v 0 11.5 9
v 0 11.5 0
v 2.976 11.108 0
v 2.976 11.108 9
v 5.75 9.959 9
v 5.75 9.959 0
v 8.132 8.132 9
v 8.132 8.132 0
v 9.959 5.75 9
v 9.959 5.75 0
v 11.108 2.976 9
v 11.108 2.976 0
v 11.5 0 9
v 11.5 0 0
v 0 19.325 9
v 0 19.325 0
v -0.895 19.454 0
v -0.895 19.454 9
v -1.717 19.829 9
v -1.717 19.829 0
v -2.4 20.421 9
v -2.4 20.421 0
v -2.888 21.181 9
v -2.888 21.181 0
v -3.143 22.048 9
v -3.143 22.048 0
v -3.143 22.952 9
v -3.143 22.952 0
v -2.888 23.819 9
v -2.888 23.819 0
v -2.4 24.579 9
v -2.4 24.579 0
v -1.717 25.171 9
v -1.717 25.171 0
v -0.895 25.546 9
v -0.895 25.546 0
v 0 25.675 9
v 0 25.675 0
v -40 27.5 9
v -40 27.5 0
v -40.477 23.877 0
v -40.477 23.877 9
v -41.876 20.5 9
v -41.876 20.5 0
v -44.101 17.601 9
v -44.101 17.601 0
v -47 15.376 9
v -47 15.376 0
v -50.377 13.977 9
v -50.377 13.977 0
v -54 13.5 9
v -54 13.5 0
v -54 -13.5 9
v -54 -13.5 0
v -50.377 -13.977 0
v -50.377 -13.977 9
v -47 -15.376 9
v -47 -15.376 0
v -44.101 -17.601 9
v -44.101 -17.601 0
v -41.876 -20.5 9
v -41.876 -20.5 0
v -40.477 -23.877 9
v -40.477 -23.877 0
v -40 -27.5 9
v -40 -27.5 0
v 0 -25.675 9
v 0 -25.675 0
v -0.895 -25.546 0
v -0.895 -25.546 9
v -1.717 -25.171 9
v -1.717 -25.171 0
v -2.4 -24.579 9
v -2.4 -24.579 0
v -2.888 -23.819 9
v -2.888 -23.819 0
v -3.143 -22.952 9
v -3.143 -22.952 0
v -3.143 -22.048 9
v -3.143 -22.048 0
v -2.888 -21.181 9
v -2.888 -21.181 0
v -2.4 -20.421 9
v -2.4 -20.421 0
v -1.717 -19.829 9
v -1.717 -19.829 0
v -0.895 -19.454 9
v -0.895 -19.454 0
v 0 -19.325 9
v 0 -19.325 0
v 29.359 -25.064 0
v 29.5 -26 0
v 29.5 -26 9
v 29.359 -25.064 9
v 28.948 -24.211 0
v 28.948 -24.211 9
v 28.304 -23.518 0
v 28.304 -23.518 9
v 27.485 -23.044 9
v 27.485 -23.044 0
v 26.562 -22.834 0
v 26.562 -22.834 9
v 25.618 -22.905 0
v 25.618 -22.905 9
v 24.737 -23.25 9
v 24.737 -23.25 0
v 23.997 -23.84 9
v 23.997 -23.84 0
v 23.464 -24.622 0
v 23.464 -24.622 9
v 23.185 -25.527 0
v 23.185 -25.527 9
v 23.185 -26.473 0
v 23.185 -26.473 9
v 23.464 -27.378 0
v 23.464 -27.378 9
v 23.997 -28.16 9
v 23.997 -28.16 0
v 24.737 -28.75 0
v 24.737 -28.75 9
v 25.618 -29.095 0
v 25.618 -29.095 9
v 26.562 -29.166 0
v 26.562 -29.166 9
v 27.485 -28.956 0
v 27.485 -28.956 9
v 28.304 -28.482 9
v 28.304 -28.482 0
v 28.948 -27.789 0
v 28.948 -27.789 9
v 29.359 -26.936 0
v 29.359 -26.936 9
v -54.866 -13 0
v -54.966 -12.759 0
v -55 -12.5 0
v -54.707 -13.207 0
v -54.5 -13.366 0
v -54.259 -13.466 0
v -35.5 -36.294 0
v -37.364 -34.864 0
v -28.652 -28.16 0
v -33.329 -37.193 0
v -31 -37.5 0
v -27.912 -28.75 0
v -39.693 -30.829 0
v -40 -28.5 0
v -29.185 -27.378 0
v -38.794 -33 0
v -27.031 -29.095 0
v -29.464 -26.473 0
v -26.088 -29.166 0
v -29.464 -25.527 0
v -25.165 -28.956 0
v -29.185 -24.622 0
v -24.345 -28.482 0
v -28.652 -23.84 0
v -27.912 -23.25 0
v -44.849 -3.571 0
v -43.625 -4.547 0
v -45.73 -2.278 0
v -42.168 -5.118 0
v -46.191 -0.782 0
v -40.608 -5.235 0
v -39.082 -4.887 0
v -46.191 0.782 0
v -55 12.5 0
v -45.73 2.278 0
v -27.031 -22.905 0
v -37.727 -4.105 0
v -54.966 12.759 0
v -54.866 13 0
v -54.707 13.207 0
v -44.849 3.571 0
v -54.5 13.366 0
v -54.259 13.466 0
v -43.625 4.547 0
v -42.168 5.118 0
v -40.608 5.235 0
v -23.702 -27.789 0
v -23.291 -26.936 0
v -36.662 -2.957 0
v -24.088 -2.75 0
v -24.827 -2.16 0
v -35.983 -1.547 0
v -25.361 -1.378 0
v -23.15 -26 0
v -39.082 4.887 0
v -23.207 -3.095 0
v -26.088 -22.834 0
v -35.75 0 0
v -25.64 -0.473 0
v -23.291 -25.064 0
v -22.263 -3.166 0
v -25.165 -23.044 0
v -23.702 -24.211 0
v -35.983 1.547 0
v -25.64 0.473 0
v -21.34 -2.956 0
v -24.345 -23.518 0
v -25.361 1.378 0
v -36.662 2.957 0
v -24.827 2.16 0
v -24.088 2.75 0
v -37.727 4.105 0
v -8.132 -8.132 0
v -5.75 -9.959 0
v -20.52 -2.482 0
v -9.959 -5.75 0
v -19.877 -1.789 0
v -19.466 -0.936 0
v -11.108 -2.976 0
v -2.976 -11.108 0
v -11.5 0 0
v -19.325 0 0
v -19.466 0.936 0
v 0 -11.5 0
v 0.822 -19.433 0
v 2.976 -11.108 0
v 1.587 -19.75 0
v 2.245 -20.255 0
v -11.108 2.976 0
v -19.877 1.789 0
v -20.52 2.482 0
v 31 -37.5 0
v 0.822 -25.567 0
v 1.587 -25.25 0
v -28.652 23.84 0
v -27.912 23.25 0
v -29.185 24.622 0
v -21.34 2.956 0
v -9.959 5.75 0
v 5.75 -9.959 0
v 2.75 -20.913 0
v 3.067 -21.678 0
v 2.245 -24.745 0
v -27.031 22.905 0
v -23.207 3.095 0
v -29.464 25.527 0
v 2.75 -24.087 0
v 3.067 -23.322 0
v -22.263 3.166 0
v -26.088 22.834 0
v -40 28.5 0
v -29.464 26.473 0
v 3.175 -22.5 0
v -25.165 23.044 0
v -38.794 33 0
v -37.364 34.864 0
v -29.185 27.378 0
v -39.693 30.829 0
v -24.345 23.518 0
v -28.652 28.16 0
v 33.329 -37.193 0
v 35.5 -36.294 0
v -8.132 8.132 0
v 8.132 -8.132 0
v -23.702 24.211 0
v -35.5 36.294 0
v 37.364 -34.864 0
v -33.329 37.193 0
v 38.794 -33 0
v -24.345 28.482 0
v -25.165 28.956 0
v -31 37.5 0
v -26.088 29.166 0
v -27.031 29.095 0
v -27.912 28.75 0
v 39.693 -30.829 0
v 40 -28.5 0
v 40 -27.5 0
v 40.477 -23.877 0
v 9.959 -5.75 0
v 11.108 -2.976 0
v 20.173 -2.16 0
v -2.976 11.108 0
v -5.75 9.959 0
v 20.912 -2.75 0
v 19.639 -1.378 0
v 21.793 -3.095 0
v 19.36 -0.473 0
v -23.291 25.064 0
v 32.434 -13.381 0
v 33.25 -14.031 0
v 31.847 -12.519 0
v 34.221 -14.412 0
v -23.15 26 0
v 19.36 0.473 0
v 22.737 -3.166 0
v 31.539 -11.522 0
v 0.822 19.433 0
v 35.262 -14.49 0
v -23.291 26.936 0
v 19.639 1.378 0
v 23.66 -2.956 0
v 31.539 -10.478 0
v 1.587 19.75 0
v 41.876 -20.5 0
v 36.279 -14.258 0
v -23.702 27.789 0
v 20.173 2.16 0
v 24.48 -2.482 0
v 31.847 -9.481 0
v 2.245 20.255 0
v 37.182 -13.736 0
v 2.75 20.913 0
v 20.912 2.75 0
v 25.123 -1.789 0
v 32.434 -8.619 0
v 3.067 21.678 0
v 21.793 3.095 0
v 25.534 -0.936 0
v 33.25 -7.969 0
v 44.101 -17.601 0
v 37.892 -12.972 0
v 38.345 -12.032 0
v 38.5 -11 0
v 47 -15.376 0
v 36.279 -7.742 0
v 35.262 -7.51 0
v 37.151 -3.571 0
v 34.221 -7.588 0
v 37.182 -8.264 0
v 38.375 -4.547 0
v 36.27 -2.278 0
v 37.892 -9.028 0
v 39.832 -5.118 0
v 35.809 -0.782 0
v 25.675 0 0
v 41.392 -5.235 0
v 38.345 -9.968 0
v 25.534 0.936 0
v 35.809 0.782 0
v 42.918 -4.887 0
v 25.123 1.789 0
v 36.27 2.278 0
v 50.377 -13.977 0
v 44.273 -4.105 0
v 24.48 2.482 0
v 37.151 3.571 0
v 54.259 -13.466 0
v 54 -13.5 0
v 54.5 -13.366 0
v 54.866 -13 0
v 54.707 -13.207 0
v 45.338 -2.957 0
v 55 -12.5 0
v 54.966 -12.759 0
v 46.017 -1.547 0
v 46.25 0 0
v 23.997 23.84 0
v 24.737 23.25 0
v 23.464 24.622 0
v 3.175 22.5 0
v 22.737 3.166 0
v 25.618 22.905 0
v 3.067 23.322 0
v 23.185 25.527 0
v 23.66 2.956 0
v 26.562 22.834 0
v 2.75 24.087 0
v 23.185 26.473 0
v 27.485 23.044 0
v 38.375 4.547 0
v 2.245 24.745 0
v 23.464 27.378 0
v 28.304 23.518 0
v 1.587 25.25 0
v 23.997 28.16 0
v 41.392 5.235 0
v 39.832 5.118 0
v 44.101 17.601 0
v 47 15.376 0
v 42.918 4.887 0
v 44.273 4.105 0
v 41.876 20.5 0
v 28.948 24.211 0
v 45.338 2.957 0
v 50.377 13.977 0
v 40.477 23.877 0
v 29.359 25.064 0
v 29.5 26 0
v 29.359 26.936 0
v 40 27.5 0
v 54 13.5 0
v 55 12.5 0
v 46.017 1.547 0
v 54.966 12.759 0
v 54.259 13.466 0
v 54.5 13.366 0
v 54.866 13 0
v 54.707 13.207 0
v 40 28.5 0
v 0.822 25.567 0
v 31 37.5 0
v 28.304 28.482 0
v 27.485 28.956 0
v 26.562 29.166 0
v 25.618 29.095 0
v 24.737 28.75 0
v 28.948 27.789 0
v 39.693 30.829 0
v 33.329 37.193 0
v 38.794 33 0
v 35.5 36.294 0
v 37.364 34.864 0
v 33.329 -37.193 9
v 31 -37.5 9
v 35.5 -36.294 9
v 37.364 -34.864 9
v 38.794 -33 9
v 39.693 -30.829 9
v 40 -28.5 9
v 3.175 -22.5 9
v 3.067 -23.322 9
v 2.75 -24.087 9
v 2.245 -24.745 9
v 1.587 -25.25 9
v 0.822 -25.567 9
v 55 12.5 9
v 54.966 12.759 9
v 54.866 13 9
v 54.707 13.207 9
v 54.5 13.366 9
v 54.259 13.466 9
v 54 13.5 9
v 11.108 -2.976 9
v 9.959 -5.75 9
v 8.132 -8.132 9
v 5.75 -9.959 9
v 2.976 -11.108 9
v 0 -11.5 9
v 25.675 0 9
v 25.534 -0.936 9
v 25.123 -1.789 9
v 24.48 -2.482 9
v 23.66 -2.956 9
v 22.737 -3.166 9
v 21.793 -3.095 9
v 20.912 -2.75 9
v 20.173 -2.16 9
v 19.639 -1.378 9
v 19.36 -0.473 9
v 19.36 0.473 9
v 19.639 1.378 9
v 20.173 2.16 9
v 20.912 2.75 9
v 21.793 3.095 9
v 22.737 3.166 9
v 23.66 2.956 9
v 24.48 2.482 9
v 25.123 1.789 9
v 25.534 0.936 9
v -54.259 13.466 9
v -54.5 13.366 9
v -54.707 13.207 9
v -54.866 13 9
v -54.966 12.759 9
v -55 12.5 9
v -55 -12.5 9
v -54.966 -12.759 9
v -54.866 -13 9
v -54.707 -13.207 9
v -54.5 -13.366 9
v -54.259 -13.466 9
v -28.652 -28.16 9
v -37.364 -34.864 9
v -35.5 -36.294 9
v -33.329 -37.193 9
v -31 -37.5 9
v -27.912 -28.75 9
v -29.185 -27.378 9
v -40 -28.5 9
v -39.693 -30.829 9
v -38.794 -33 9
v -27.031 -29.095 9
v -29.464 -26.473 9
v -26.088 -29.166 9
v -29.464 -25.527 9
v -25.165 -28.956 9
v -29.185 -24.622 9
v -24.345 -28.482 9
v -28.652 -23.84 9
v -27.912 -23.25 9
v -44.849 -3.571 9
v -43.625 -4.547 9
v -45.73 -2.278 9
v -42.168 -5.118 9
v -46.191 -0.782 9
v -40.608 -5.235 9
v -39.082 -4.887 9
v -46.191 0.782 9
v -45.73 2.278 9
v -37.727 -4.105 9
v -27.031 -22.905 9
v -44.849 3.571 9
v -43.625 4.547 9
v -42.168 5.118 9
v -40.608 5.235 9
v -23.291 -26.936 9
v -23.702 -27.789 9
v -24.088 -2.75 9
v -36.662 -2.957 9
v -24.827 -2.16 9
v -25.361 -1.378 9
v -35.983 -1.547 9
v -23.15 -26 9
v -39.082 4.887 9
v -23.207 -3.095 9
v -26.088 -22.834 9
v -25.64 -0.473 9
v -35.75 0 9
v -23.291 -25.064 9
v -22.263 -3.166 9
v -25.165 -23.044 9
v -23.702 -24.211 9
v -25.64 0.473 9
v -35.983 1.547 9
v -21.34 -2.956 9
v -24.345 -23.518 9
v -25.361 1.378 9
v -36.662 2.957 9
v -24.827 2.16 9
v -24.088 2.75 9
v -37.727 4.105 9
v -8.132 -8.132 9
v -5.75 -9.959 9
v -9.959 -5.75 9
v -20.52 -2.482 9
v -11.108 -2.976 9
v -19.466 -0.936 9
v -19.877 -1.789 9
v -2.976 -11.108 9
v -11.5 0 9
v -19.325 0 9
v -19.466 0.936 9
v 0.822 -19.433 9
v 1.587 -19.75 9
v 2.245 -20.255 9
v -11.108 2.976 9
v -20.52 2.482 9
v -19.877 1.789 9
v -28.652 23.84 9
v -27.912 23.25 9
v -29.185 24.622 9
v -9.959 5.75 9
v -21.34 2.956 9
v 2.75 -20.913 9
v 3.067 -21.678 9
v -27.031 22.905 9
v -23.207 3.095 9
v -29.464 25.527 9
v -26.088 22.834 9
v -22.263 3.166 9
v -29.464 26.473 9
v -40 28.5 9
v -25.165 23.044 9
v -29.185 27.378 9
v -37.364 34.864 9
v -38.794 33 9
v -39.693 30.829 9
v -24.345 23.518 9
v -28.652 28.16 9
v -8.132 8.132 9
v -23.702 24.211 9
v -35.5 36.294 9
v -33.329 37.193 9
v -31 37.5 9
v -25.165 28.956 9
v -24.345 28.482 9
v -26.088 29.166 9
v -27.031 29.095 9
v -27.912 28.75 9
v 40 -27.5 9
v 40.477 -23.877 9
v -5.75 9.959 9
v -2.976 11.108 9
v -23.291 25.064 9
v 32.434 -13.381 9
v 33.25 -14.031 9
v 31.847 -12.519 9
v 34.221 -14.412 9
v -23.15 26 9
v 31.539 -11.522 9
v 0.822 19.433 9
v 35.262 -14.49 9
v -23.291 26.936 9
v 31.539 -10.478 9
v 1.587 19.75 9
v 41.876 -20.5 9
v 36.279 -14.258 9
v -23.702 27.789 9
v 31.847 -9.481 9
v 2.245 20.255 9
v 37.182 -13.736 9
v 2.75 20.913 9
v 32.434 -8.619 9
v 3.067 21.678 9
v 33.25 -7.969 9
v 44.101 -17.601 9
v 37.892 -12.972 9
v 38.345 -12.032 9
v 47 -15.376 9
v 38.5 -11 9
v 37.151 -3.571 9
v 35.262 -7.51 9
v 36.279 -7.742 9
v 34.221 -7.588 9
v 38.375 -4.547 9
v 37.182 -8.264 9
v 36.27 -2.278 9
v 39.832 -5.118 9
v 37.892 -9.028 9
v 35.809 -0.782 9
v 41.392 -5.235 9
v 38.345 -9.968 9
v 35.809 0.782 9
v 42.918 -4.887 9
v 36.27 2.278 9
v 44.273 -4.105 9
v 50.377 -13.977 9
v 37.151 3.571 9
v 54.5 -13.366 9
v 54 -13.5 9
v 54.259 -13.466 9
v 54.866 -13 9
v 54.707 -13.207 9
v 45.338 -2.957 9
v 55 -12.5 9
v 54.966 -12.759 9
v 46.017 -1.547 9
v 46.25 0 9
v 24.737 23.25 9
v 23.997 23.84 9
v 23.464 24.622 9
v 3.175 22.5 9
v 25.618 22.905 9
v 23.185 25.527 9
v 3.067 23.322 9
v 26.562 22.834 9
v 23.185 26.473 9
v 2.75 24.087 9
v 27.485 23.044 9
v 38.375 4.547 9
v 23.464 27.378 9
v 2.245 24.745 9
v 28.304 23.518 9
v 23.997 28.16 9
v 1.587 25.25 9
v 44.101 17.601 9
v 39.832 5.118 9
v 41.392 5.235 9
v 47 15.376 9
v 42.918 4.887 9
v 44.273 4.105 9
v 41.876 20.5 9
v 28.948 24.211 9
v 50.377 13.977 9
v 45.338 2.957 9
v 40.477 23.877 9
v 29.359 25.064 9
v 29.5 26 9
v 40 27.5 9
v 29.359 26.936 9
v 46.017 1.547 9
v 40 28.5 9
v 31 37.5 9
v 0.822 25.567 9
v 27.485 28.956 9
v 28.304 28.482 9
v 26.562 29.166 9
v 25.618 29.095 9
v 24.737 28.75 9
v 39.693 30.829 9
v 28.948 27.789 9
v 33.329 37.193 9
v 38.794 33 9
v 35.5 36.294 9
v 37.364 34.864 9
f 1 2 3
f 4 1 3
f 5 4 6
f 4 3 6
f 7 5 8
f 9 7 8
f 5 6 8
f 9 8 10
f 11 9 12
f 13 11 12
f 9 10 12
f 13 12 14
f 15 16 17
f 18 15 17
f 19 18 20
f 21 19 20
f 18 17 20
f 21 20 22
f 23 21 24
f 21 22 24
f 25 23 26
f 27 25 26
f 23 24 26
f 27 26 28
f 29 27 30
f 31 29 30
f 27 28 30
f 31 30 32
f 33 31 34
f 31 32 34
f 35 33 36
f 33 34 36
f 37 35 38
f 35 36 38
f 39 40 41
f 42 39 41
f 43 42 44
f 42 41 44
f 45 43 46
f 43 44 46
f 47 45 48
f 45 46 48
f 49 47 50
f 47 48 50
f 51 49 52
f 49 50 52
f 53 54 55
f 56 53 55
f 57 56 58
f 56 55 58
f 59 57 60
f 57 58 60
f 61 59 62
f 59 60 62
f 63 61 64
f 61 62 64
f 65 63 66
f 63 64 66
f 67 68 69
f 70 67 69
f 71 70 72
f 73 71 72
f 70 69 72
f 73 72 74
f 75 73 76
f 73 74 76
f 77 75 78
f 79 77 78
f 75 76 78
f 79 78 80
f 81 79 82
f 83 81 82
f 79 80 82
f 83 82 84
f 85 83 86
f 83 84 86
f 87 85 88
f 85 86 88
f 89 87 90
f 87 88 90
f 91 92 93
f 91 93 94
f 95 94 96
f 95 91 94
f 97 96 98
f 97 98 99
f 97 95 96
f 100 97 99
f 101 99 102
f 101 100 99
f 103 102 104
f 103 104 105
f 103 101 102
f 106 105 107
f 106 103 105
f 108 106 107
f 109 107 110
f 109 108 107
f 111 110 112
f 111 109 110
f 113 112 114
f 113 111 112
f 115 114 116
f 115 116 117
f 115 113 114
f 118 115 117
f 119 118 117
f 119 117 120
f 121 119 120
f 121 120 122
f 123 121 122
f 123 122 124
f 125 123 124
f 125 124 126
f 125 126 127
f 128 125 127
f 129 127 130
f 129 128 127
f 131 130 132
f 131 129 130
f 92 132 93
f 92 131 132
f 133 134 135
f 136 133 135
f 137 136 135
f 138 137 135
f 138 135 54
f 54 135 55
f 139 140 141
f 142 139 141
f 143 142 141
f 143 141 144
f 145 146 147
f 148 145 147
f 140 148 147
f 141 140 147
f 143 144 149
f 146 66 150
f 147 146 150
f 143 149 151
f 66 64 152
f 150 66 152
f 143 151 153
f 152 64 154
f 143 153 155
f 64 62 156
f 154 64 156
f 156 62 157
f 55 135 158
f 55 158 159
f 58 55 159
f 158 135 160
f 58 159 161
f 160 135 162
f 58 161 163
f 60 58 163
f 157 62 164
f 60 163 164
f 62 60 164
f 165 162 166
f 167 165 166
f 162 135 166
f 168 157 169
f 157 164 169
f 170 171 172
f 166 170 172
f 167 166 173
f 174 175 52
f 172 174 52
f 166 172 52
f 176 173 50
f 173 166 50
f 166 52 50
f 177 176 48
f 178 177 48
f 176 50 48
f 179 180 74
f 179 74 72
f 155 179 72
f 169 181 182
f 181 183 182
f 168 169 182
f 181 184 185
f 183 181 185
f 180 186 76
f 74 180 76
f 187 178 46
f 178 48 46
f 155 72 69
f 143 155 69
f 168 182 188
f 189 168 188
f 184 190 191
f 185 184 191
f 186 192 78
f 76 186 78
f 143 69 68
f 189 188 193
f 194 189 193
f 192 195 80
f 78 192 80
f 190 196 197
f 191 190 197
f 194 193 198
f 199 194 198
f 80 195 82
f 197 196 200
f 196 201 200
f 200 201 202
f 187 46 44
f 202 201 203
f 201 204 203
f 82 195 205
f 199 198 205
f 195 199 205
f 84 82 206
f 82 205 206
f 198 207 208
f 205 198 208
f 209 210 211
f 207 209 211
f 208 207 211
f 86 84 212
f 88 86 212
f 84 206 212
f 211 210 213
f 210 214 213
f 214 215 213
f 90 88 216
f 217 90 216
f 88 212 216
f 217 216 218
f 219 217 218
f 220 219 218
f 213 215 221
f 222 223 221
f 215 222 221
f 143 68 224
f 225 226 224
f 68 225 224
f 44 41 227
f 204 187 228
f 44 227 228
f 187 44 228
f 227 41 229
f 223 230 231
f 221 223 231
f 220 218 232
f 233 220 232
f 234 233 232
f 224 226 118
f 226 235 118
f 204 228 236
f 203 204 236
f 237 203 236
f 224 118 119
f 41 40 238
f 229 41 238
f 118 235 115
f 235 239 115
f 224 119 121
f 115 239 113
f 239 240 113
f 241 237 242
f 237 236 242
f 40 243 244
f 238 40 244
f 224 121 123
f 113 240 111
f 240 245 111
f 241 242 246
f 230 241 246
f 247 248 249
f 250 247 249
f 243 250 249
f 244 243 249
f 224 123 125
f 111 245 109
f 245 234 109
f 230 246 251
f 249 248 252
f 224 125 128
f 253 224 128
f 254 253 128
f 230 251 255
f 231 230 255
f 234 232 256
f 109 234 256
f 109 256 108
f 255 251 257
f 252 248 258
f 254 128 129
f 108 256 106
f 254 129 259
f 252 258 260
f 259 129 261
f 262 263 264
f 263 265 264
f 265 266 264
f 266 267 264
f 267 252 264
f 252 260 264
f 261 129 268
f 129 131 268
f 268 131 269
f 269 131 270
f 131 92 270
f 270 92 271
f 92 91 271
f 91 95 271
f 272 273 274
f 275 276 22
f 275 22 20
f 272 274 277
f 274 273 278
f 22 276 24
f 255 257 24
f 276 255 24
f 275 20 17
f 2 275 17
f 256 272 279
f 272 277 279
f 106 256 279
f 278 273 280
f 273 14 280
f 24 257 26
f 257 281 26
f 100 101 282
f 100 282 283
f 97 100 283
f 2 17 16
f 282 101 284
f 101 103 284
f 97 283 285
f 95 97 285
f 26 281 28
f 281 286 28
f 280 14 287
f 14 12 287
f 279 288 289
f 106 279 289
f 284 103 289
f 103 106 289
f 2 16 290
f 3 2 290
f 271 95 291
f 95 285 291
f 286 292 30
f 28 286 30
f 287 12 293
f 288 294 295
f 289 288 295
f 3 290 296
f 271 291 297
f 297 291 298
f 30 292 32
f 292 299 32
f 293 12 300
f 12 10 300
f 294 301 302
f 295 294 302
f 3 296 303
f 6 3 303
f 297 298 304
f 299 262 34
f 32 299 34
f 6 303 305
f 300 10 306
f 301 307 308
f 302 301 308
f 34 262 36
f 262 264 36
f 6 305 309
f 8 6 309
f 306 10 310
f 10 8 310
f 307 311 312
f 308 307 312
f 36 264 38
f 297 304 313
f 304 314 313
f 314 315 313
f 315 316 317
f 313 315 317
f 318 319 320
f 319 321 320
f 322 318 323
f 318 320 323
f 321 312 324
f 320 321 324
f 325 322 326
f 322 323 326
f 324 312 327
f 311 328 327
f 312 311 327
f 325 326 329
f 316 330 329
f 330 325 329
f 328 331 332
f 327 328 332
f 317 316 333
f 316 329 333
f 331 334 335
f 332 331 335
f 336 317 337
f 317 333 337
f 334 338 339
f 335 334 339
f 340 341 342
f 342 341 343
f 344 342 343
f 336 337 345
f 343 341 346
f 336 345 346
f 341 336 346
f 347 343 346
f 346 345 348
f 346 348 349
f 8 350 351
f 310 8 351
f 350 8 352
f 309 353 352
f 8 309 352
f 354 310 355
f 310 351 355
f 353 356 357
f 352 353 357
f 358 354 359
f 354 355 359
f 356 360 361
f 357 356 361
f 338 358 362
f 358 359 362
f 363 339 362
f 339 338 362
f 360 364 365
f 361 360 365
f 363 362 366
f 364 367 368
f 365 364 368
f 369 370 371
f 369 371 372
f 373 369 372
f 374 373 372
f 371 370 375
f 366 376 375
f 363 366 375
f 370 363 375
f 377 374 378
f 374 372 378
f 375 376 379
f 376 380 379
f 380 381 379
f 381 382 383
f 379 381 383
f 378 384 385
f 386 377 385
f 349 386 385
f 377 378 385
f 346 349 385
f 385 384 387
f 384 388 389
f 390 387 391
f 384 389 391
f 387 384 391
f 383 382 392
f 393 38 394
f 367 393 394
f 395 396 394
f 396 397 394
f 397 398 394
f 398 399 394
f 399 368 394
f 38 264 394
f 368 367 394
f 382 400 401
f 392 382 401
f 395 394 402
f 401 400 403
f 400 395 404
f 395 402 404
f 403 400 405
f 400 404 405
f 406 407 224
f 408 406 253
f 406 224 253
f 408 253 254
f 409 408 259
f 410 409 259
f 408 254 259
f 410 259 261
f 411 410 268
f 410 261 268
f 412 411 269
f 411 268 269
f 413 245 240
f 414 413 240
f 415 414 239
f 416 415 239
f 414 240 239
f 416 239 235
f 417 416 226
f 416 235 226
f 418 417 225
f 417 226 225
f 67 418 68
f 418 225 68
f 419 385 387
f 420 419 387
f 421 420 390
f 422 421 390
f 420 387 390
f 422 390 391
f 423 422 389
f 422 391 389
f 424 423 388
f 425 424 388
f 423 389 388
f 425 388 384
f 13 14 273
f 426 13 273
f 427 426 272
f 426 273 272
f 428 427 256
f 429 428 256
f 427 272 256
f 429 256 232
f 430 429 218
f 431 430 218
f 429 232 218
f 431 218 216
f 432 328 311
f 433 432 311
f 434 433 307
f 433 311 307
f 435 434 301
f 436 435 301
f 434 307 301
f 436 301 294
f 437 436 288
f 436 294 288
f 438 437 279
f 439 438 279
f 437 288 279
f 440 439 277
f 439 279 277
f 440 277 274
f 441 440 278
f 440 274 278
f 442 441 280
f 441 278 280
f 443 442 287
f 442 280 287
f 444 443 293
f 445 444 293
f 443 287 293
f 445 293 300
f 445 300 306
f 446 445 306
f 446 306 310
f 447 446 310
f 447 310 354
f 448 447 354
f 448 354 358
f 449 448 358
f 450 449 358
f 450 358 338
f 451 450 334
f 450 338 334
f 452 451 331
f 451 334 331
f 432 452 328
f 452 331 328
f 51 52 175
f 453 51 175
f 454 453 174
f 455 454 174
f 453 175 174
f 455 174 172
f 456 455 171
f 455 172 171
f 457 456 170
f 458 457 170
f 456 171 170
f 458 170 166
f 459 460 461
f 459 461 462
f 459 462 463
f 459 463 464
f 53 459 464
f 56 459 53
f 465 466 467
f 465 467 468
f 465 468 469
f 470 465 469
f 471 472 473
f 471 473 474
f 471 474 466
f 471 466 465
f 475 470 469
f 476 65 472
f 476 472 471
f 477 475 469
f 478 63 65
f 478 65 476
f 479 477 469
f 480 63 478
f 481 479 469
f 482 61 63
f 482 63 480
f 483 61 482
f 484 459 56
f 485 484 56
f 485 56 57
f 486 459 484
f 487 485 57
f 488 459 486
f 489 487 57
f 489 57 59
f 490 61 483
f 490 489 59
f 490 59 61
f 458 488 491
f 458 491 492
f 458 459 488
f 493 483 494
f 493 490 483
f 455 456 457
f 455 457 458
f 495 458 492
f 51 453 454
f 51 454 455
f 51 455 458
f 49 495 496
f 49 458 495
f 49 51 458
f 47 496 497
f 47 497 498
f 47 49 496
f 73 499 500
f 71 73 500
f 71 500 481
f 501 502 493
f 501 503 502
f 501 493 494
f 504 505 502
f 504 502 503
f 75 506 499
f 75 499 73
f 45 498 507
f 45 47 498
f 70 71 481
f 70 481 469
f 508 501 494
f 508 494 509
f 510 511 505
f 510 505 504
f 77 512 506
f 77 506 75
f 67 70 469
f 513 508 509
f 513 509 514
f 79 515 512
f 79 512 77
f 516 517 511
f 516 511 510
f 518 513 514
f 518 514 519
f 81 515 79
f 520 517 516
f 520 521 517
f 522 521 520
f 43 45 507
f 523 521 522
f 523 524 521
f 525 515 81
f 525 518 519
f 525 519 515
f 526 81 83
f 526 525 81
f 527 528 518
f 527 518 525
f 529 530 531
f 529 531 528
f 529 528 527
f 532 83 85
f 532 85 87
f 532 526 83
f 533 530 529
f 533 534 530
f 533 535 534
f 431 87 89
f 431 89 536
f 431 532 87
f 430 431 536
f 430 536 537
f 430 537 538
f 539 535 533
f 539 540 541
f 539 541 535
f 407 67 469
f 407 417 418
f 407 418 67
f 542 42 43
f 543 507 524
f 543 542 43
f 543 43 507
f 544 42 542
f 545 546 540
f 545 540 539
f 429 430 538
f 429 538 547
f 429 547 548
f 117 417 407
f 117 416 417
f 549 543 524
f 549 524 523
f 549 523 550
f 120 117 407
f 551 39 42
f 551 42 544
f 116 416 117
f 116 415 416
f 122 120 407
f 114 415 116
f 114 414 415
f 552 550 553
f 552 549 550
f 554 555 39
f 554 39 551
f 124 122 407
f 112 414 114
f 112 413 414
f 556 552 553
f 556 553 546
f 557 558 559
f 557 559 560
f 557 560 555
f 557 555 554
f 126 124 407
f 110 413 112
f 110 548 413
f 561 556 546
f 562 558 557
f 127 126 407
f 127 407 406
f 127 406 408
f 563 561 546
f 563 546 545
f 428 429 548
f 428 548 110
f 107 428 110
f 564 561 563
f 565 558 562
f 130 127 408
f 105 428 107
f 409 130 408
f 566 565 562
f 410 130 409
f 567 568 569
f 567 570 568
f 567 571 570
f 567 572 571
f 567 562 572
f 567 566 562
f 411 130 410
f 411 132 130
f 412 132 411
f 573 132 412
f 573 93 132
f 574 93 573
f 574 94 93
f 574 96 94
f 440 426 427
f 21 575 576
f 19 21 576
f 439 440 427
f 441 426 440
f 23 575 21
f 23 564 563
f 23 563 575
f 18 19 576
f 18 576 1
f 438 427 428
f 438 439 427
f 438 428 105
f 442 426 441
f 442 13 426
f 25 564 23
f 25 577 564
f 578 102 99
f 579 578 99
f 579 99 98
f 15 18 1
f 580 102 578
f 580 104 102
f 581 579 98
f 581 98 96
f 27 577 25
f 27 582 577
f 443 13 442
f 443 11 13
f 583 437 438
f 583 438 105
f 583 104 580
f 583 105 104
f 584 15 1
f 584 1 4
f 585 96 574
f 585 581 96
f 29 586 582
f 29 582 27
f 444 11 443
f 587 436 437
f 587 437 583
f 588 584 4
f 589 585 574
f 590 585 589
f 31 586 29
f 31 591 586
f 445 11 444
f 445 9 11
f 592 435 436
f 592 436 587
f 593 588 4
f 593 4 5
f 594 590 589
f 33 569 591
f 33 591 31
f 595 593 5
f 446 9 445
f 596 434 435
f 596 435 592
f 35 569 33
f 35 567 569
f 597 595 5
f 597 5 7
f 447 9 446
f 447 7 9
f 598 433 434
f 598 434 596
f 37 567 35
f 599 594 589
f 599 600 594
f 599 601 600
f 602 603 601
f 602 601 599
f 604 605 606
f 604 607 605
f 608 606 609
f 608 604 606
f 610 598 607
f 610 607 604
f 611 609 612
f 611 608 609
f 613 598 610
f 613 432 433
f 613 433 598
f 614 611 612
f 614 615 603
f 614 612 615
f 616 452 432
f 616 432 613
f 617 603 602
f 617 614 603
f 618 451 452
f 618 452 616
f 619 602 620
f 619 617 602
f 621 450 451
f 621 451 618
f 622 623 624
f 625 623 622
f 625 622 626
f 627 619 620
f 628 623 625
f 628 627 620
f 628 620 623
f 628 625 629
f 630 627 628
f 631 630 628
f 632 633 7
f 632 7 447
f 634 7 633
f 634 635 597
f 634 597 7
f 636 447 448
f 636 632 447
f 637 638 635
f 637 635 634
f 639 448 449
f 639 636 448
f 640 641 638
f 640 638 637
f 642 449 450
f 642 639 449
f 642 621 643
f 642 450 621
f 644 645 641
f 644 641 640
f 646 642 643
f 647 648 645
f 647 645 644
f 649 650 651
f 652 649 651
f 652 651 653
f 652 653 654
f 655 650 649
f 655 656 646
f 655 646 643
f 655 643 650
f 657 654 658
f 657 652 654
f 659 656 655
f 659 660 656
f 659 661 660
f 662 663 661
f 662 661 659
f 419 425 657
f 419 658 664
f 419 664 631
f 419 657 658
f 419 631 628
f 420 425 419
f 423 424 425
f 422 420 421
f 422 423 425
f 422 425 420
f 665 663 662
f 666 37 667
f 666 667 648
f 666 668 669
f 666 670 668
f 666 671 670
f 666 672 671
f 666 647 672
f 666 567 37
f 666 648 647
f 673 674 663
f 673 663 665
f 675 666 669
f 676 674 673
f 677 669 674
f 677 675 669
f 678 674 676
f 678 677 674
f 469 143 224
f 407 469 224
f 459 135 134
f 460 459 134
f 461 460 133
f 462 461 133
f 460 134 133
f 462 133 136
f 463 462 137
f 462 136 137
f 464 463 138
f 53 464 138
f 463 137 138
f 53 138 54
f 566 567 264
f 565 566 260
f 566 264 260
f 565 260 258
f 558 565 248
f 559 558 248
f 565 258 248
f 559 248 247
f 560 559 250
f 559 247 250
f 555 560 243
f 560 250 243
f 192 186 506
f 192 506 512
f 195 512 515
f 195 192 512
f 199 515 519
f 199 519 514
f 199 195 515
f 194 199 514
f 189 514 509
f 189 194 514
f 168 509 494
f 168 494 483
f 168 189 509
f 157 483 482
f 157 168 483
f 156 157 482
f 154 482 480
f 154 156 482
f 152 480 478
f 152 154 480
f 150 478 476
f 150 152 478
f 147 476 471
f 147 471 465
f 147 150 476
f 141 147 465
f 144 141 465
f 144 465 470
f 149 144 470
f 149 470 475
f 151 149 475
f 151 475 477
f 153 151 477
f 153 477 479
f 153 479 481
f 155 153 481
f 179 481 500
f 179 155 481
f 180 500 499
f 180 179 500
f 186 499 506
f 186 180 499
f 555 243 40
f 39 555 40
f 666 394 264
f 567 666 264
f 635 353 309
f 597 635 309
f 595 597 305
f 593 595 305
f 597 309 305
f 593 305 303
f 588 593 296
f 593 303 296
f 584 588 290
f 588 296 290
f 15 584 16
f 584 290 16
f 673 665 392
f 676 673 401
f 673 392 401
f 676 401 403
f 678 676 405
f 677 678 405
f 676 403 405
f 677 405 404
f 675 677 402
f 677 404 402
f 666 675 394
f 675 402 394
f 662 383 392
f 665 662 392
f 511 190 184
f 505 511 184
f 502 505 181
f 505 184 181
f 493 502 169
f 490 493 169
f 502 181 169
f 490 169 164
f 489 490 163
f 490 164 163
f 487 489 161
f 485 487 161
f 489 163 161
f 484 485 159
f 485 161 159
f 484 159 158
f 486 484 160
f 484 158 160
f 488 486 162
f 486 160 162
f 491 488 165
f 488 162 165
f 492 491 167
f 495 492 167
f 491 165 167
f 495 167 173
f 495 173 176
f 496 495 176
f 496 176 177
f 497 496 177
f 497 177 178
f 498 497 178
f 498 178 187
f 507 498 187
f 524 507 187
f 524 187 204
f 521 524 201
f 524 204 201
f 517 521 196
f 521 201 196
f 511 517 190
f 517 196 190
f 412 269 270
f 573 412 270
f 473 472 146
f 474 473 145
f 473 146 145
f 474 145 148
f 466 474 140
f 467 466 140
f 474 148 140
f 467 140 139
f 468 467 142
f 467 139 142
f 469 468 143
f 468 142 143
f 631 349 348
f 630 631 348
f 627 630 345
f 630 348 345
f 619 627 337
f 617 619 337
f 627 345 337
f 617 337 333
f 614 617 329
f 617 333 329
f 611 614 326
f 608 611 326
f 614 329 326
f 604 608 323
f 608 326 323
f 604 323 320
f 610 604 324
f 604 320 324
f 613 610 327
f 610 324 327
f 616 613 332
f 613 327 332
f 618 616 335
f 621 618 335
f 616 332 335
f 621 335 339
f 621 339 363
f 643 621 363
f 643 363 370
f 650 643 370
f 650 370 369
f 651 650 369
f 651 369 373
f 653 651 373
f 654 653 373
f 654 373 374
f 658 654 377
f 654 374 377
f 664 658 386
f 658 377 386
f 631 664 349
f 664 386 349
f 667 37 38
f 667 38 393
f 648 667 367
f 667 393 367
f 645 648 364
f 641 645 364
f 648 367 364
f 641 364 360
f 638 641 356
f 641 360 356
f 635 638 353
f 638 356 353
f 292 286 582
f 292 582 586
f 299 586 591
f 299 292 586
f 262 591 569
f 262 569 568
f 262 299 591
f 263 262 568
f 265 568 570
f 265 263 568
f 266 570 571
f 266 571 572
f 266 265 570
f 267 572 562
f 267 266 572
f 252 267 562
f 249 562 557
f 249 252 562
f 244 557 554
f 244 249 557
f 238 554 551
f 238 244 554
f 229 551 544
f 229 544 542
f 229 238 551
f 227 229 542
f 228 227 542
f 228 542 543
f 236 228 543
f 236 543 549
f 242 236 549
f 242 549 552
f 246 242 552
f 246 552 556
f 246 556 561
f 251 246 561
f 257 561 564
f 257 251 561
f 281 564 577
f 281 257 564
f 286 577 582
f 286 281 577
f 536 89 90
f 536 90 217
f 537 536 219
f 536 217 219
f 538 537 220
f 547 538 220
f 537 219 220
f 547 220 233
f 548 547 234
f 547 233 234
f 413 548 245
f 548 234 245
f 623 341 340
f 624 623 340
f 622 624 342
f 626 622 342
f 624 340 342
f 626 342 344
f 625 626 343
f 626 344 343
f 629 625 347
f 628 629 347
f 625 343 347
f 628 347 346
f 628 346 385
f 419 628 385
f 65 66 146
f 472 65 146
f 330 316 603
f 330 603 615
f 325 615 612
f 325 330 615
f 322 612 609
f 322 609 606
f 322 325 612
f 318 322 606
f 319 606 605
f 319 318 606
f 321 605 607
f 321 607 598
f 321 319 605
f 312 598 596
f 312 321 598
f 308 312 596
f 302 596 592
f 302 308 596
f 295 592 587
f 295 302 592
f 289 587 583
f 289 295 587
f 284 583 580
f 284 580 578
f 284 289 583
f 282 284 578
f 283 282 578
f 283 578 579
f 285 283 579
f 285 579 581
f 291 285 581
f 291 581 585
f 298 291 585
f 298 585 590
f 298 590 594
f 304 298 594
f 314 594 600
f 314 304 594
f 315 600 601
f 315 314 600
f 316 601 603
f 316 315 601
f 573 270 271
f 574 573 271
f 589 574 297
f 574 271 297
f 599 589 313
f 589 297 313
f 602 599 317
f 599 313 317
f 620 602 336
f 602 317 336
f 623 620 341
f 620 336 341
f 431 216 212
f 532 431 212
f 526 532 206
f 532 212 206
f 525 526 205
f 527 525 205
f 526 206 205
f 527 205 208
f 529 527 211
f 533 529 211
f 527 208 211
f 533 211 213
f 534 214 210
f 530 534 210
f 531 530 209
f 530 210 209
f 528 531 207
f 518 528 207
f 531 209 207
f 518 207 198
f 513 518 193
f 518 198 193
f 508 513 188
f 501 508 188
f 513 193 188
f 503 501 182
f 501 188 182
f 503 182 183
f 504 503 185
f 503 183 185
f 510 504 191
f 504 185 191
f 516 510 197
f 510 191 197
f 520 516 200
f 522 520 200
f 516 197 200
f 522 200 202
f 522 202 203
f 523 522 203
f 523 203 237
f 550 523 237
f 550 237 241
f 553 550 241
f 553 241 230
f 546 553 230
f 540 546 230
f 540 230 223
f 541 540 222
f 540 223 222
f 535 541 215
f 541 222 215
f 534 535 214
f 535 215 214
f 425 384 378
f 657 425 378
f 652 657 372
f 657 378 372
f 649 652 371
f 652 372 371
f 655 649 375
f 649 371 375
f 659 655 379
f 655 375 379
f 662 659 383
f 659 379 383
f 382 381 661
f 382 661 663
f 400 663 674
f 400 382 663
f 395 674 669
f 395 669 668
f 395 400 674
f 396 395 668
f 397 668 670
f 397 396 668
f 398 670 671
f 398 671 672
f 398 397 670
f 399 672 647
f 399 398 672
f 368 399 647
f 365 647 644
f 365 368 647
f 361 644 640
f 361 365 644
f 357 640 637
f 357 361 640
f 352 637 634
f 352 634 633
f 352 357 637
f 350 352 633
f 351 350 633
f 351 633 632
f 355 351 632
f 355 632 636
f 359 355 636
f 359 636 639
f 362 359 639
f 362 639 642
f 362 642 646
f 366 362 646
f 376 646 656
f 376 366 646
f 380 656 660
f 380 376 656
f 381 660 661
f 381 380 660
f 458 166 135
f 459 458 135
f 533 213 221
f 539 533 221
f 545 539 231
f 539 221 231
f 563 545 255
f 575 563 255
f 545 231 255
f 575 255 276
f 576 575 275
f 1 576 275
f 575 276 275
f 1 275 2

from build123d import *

# Parameters (mm, degrees)
F0_R     = 3.175
F0_R_2   = 3.5
F1_DEPTH = 9


with BuildPart() as f1:
    # F0 (on Top) → F1 (new body)
    with BuildSketch(Plane.XY):
        with BuildLine():
            Line((0, 25.675), (0, 37.5))
            Line((0, 37.5), (-31, 37.5))
            ThreePointArc((-31, 37.5), (-37.363961, 34.863961), (-40, 28.5))
            Line((-40, 28.5), (-40, 27.5))
            ThreePointArc((-40, 27.5), (-44.100505, 17.600505), (-54, 13.5))
            ThreePointArc((-54, 13.5), (-54.707107, 13.207107), (-55, 12.5))
            Line((-55, 12.5), (-55, 0))
            Line((-55, 0), (-46.25, 0))
            ThreePointArc((-46.25, 0), (-41, 5.25), (-35.75, 0))
            Line((-35.75, 0), (-25.675, 0))
            ThreePointArc((-25.675, 0), (-22.5, 3.175), (-19.325, 0))
            Line((-19.325, 0), (-11.5, 0))
            ThreePointArc((-11.5, 0), (-8.131728, 8.131728), (0, 11.5))
            Line((0, 11.5), (0, 19.325))
            ThreePointArc((0, 19.325), (-3.175, 22.5), (0, 25.675))
        make_face()
        with Locations((-26.324893, 26)):
            Circle(F0_R, mode=Mode.SUBTRACT)
        with BuildLine():
            Line((31, 37.5), (0, 37.5))
            Line((0, 37.5), (0, 25.675))
            ThreePointArc((0, 25.675), (2.245064, 24.745064), (3.175, 22.5))
            ThreePointArc((3.175, 22.5), (2.245064, 20.254936), (0, 19.325))
            Line((0, 19.325), (0, 11.5))
            ThreePointArc((0, 11.5), (8.131728, 8.131728), (11.5, 0))
            Line((11.5, 0), (19.325, 0))
            ThreePointArc((19.325, 0), (22.5, 3.175), (25.675, 0))
            Line((25.675, 0), (35.75, 0))
            ThreePointArc((35.75, 0), (41, 5.25), (46.25, 0))
            Line((46.25, 0), (55, 0))
            Line((55, 0), (55, 12.5))
            ThreePointArc((55, 12.5), (54.707107, 13.207107), (54, 13.5))
            ThreePointArc((54, 13.5), (44.100505, 17.600505), (40, 27.5))
            Line((40, 27.5), (40, 28.5))
            ThreePointArc((40, 28.5), (37.363961, 34.863961), (31, 37.5))
        make_face()
        with Locations((26.324893, 26)):
            Circle(F0_R, mode=Mode.SUBTRACT)
        with BuildLine():
            Line((19.325, 0), (11.5, 0))
            ThreePointArc((11.5, 0), (8.131728, -8.131728), (0, -11.5))
            Line((0, -11.5), (0, -19.325))
            ThreePointArc((0, -19.325), (2.245064, -20.254936), (3.175, -22.5))
            ThreePointArc((3.175, -22.5), (2.245064, -24.745064), (0, -25.675))
            Line((0, -25.675), (0, -37.5))
            Line((0, -37.5), (31, -37.5))
            ThreePointArc((31, -37.5), (37.363961, -34.863961), (40, -28.5))
            Line((40, -28.5), (40, -27.5))
            ThreePointArc((40, -27.5), (44.100505, -17.600505), (54, -13.5))
            ThreePointArc((54, -13.5), (54.707107, -13.207107), (55, -12.5))
            Line((55, -12.5), (55, 0))
            Line((55, 0), (46.25, 0))
            ThreePointArc((46.25, 0), (41, -5.25), (35.75, 0))
            Line((35.75, 0), (25.675, 0))
            ThreePointArc((25.675, 0), (22.5, -3.175), (19.325, 0))
        make_face()
        with Locations((26.324893, -26)):
            Circle(F0_R, mode=Mode.SUBTRACT)
        with Locations((35, -11)):
            Circle(F0_R_2, mode=Mode.SUBTRACT)
        with BuildLine():
            ThreePointArc((0, -11.5), (-8.131728, -8.131728), (-11.5, 0))
            Line((-11.5, 0), (-19.325, 0))
            ThreePointArc((-19.325, 0), (-22.5, -3.175), (-25.675, 0))
            Line((-25.675, 0), (-35.75, 0))
            ThreePointArc((-35.75, 0), (-41, -5.25), (-46.25, 0))
            Line((-46.25, 0), (-55, 0))
            Line((-55, 0), (-55, -12.5))
            ThreePointArc((-55, -12.5), (-54.707107, -13.207107), (-54, -13.5))
            ThreePointArc((-54, -13.5), (-44.100505, -17.600505), (-40, -27.5))
            Line((-40, -27.5), (-40, -28.5))
            ThreePointArc((-40, -28.5), (-37.363961, -34.863961), (-31, -37.5))
            Line((-31, -37.5), (0, -37.5))
            Line((0, -37.5), (0, -25.675))
            ThreePointArc((0, -25.675), (-3.175, -22.5), (0, -19.325))
            Line((0, -19.325), (0, -11.5))
        make_face()
        with Locations((-26.324893, -26)):
            Circle(F0_R, mode=Mode.SUBTRACT)
    extrude(amount=F1_DEPTH)


solid = f1.part
